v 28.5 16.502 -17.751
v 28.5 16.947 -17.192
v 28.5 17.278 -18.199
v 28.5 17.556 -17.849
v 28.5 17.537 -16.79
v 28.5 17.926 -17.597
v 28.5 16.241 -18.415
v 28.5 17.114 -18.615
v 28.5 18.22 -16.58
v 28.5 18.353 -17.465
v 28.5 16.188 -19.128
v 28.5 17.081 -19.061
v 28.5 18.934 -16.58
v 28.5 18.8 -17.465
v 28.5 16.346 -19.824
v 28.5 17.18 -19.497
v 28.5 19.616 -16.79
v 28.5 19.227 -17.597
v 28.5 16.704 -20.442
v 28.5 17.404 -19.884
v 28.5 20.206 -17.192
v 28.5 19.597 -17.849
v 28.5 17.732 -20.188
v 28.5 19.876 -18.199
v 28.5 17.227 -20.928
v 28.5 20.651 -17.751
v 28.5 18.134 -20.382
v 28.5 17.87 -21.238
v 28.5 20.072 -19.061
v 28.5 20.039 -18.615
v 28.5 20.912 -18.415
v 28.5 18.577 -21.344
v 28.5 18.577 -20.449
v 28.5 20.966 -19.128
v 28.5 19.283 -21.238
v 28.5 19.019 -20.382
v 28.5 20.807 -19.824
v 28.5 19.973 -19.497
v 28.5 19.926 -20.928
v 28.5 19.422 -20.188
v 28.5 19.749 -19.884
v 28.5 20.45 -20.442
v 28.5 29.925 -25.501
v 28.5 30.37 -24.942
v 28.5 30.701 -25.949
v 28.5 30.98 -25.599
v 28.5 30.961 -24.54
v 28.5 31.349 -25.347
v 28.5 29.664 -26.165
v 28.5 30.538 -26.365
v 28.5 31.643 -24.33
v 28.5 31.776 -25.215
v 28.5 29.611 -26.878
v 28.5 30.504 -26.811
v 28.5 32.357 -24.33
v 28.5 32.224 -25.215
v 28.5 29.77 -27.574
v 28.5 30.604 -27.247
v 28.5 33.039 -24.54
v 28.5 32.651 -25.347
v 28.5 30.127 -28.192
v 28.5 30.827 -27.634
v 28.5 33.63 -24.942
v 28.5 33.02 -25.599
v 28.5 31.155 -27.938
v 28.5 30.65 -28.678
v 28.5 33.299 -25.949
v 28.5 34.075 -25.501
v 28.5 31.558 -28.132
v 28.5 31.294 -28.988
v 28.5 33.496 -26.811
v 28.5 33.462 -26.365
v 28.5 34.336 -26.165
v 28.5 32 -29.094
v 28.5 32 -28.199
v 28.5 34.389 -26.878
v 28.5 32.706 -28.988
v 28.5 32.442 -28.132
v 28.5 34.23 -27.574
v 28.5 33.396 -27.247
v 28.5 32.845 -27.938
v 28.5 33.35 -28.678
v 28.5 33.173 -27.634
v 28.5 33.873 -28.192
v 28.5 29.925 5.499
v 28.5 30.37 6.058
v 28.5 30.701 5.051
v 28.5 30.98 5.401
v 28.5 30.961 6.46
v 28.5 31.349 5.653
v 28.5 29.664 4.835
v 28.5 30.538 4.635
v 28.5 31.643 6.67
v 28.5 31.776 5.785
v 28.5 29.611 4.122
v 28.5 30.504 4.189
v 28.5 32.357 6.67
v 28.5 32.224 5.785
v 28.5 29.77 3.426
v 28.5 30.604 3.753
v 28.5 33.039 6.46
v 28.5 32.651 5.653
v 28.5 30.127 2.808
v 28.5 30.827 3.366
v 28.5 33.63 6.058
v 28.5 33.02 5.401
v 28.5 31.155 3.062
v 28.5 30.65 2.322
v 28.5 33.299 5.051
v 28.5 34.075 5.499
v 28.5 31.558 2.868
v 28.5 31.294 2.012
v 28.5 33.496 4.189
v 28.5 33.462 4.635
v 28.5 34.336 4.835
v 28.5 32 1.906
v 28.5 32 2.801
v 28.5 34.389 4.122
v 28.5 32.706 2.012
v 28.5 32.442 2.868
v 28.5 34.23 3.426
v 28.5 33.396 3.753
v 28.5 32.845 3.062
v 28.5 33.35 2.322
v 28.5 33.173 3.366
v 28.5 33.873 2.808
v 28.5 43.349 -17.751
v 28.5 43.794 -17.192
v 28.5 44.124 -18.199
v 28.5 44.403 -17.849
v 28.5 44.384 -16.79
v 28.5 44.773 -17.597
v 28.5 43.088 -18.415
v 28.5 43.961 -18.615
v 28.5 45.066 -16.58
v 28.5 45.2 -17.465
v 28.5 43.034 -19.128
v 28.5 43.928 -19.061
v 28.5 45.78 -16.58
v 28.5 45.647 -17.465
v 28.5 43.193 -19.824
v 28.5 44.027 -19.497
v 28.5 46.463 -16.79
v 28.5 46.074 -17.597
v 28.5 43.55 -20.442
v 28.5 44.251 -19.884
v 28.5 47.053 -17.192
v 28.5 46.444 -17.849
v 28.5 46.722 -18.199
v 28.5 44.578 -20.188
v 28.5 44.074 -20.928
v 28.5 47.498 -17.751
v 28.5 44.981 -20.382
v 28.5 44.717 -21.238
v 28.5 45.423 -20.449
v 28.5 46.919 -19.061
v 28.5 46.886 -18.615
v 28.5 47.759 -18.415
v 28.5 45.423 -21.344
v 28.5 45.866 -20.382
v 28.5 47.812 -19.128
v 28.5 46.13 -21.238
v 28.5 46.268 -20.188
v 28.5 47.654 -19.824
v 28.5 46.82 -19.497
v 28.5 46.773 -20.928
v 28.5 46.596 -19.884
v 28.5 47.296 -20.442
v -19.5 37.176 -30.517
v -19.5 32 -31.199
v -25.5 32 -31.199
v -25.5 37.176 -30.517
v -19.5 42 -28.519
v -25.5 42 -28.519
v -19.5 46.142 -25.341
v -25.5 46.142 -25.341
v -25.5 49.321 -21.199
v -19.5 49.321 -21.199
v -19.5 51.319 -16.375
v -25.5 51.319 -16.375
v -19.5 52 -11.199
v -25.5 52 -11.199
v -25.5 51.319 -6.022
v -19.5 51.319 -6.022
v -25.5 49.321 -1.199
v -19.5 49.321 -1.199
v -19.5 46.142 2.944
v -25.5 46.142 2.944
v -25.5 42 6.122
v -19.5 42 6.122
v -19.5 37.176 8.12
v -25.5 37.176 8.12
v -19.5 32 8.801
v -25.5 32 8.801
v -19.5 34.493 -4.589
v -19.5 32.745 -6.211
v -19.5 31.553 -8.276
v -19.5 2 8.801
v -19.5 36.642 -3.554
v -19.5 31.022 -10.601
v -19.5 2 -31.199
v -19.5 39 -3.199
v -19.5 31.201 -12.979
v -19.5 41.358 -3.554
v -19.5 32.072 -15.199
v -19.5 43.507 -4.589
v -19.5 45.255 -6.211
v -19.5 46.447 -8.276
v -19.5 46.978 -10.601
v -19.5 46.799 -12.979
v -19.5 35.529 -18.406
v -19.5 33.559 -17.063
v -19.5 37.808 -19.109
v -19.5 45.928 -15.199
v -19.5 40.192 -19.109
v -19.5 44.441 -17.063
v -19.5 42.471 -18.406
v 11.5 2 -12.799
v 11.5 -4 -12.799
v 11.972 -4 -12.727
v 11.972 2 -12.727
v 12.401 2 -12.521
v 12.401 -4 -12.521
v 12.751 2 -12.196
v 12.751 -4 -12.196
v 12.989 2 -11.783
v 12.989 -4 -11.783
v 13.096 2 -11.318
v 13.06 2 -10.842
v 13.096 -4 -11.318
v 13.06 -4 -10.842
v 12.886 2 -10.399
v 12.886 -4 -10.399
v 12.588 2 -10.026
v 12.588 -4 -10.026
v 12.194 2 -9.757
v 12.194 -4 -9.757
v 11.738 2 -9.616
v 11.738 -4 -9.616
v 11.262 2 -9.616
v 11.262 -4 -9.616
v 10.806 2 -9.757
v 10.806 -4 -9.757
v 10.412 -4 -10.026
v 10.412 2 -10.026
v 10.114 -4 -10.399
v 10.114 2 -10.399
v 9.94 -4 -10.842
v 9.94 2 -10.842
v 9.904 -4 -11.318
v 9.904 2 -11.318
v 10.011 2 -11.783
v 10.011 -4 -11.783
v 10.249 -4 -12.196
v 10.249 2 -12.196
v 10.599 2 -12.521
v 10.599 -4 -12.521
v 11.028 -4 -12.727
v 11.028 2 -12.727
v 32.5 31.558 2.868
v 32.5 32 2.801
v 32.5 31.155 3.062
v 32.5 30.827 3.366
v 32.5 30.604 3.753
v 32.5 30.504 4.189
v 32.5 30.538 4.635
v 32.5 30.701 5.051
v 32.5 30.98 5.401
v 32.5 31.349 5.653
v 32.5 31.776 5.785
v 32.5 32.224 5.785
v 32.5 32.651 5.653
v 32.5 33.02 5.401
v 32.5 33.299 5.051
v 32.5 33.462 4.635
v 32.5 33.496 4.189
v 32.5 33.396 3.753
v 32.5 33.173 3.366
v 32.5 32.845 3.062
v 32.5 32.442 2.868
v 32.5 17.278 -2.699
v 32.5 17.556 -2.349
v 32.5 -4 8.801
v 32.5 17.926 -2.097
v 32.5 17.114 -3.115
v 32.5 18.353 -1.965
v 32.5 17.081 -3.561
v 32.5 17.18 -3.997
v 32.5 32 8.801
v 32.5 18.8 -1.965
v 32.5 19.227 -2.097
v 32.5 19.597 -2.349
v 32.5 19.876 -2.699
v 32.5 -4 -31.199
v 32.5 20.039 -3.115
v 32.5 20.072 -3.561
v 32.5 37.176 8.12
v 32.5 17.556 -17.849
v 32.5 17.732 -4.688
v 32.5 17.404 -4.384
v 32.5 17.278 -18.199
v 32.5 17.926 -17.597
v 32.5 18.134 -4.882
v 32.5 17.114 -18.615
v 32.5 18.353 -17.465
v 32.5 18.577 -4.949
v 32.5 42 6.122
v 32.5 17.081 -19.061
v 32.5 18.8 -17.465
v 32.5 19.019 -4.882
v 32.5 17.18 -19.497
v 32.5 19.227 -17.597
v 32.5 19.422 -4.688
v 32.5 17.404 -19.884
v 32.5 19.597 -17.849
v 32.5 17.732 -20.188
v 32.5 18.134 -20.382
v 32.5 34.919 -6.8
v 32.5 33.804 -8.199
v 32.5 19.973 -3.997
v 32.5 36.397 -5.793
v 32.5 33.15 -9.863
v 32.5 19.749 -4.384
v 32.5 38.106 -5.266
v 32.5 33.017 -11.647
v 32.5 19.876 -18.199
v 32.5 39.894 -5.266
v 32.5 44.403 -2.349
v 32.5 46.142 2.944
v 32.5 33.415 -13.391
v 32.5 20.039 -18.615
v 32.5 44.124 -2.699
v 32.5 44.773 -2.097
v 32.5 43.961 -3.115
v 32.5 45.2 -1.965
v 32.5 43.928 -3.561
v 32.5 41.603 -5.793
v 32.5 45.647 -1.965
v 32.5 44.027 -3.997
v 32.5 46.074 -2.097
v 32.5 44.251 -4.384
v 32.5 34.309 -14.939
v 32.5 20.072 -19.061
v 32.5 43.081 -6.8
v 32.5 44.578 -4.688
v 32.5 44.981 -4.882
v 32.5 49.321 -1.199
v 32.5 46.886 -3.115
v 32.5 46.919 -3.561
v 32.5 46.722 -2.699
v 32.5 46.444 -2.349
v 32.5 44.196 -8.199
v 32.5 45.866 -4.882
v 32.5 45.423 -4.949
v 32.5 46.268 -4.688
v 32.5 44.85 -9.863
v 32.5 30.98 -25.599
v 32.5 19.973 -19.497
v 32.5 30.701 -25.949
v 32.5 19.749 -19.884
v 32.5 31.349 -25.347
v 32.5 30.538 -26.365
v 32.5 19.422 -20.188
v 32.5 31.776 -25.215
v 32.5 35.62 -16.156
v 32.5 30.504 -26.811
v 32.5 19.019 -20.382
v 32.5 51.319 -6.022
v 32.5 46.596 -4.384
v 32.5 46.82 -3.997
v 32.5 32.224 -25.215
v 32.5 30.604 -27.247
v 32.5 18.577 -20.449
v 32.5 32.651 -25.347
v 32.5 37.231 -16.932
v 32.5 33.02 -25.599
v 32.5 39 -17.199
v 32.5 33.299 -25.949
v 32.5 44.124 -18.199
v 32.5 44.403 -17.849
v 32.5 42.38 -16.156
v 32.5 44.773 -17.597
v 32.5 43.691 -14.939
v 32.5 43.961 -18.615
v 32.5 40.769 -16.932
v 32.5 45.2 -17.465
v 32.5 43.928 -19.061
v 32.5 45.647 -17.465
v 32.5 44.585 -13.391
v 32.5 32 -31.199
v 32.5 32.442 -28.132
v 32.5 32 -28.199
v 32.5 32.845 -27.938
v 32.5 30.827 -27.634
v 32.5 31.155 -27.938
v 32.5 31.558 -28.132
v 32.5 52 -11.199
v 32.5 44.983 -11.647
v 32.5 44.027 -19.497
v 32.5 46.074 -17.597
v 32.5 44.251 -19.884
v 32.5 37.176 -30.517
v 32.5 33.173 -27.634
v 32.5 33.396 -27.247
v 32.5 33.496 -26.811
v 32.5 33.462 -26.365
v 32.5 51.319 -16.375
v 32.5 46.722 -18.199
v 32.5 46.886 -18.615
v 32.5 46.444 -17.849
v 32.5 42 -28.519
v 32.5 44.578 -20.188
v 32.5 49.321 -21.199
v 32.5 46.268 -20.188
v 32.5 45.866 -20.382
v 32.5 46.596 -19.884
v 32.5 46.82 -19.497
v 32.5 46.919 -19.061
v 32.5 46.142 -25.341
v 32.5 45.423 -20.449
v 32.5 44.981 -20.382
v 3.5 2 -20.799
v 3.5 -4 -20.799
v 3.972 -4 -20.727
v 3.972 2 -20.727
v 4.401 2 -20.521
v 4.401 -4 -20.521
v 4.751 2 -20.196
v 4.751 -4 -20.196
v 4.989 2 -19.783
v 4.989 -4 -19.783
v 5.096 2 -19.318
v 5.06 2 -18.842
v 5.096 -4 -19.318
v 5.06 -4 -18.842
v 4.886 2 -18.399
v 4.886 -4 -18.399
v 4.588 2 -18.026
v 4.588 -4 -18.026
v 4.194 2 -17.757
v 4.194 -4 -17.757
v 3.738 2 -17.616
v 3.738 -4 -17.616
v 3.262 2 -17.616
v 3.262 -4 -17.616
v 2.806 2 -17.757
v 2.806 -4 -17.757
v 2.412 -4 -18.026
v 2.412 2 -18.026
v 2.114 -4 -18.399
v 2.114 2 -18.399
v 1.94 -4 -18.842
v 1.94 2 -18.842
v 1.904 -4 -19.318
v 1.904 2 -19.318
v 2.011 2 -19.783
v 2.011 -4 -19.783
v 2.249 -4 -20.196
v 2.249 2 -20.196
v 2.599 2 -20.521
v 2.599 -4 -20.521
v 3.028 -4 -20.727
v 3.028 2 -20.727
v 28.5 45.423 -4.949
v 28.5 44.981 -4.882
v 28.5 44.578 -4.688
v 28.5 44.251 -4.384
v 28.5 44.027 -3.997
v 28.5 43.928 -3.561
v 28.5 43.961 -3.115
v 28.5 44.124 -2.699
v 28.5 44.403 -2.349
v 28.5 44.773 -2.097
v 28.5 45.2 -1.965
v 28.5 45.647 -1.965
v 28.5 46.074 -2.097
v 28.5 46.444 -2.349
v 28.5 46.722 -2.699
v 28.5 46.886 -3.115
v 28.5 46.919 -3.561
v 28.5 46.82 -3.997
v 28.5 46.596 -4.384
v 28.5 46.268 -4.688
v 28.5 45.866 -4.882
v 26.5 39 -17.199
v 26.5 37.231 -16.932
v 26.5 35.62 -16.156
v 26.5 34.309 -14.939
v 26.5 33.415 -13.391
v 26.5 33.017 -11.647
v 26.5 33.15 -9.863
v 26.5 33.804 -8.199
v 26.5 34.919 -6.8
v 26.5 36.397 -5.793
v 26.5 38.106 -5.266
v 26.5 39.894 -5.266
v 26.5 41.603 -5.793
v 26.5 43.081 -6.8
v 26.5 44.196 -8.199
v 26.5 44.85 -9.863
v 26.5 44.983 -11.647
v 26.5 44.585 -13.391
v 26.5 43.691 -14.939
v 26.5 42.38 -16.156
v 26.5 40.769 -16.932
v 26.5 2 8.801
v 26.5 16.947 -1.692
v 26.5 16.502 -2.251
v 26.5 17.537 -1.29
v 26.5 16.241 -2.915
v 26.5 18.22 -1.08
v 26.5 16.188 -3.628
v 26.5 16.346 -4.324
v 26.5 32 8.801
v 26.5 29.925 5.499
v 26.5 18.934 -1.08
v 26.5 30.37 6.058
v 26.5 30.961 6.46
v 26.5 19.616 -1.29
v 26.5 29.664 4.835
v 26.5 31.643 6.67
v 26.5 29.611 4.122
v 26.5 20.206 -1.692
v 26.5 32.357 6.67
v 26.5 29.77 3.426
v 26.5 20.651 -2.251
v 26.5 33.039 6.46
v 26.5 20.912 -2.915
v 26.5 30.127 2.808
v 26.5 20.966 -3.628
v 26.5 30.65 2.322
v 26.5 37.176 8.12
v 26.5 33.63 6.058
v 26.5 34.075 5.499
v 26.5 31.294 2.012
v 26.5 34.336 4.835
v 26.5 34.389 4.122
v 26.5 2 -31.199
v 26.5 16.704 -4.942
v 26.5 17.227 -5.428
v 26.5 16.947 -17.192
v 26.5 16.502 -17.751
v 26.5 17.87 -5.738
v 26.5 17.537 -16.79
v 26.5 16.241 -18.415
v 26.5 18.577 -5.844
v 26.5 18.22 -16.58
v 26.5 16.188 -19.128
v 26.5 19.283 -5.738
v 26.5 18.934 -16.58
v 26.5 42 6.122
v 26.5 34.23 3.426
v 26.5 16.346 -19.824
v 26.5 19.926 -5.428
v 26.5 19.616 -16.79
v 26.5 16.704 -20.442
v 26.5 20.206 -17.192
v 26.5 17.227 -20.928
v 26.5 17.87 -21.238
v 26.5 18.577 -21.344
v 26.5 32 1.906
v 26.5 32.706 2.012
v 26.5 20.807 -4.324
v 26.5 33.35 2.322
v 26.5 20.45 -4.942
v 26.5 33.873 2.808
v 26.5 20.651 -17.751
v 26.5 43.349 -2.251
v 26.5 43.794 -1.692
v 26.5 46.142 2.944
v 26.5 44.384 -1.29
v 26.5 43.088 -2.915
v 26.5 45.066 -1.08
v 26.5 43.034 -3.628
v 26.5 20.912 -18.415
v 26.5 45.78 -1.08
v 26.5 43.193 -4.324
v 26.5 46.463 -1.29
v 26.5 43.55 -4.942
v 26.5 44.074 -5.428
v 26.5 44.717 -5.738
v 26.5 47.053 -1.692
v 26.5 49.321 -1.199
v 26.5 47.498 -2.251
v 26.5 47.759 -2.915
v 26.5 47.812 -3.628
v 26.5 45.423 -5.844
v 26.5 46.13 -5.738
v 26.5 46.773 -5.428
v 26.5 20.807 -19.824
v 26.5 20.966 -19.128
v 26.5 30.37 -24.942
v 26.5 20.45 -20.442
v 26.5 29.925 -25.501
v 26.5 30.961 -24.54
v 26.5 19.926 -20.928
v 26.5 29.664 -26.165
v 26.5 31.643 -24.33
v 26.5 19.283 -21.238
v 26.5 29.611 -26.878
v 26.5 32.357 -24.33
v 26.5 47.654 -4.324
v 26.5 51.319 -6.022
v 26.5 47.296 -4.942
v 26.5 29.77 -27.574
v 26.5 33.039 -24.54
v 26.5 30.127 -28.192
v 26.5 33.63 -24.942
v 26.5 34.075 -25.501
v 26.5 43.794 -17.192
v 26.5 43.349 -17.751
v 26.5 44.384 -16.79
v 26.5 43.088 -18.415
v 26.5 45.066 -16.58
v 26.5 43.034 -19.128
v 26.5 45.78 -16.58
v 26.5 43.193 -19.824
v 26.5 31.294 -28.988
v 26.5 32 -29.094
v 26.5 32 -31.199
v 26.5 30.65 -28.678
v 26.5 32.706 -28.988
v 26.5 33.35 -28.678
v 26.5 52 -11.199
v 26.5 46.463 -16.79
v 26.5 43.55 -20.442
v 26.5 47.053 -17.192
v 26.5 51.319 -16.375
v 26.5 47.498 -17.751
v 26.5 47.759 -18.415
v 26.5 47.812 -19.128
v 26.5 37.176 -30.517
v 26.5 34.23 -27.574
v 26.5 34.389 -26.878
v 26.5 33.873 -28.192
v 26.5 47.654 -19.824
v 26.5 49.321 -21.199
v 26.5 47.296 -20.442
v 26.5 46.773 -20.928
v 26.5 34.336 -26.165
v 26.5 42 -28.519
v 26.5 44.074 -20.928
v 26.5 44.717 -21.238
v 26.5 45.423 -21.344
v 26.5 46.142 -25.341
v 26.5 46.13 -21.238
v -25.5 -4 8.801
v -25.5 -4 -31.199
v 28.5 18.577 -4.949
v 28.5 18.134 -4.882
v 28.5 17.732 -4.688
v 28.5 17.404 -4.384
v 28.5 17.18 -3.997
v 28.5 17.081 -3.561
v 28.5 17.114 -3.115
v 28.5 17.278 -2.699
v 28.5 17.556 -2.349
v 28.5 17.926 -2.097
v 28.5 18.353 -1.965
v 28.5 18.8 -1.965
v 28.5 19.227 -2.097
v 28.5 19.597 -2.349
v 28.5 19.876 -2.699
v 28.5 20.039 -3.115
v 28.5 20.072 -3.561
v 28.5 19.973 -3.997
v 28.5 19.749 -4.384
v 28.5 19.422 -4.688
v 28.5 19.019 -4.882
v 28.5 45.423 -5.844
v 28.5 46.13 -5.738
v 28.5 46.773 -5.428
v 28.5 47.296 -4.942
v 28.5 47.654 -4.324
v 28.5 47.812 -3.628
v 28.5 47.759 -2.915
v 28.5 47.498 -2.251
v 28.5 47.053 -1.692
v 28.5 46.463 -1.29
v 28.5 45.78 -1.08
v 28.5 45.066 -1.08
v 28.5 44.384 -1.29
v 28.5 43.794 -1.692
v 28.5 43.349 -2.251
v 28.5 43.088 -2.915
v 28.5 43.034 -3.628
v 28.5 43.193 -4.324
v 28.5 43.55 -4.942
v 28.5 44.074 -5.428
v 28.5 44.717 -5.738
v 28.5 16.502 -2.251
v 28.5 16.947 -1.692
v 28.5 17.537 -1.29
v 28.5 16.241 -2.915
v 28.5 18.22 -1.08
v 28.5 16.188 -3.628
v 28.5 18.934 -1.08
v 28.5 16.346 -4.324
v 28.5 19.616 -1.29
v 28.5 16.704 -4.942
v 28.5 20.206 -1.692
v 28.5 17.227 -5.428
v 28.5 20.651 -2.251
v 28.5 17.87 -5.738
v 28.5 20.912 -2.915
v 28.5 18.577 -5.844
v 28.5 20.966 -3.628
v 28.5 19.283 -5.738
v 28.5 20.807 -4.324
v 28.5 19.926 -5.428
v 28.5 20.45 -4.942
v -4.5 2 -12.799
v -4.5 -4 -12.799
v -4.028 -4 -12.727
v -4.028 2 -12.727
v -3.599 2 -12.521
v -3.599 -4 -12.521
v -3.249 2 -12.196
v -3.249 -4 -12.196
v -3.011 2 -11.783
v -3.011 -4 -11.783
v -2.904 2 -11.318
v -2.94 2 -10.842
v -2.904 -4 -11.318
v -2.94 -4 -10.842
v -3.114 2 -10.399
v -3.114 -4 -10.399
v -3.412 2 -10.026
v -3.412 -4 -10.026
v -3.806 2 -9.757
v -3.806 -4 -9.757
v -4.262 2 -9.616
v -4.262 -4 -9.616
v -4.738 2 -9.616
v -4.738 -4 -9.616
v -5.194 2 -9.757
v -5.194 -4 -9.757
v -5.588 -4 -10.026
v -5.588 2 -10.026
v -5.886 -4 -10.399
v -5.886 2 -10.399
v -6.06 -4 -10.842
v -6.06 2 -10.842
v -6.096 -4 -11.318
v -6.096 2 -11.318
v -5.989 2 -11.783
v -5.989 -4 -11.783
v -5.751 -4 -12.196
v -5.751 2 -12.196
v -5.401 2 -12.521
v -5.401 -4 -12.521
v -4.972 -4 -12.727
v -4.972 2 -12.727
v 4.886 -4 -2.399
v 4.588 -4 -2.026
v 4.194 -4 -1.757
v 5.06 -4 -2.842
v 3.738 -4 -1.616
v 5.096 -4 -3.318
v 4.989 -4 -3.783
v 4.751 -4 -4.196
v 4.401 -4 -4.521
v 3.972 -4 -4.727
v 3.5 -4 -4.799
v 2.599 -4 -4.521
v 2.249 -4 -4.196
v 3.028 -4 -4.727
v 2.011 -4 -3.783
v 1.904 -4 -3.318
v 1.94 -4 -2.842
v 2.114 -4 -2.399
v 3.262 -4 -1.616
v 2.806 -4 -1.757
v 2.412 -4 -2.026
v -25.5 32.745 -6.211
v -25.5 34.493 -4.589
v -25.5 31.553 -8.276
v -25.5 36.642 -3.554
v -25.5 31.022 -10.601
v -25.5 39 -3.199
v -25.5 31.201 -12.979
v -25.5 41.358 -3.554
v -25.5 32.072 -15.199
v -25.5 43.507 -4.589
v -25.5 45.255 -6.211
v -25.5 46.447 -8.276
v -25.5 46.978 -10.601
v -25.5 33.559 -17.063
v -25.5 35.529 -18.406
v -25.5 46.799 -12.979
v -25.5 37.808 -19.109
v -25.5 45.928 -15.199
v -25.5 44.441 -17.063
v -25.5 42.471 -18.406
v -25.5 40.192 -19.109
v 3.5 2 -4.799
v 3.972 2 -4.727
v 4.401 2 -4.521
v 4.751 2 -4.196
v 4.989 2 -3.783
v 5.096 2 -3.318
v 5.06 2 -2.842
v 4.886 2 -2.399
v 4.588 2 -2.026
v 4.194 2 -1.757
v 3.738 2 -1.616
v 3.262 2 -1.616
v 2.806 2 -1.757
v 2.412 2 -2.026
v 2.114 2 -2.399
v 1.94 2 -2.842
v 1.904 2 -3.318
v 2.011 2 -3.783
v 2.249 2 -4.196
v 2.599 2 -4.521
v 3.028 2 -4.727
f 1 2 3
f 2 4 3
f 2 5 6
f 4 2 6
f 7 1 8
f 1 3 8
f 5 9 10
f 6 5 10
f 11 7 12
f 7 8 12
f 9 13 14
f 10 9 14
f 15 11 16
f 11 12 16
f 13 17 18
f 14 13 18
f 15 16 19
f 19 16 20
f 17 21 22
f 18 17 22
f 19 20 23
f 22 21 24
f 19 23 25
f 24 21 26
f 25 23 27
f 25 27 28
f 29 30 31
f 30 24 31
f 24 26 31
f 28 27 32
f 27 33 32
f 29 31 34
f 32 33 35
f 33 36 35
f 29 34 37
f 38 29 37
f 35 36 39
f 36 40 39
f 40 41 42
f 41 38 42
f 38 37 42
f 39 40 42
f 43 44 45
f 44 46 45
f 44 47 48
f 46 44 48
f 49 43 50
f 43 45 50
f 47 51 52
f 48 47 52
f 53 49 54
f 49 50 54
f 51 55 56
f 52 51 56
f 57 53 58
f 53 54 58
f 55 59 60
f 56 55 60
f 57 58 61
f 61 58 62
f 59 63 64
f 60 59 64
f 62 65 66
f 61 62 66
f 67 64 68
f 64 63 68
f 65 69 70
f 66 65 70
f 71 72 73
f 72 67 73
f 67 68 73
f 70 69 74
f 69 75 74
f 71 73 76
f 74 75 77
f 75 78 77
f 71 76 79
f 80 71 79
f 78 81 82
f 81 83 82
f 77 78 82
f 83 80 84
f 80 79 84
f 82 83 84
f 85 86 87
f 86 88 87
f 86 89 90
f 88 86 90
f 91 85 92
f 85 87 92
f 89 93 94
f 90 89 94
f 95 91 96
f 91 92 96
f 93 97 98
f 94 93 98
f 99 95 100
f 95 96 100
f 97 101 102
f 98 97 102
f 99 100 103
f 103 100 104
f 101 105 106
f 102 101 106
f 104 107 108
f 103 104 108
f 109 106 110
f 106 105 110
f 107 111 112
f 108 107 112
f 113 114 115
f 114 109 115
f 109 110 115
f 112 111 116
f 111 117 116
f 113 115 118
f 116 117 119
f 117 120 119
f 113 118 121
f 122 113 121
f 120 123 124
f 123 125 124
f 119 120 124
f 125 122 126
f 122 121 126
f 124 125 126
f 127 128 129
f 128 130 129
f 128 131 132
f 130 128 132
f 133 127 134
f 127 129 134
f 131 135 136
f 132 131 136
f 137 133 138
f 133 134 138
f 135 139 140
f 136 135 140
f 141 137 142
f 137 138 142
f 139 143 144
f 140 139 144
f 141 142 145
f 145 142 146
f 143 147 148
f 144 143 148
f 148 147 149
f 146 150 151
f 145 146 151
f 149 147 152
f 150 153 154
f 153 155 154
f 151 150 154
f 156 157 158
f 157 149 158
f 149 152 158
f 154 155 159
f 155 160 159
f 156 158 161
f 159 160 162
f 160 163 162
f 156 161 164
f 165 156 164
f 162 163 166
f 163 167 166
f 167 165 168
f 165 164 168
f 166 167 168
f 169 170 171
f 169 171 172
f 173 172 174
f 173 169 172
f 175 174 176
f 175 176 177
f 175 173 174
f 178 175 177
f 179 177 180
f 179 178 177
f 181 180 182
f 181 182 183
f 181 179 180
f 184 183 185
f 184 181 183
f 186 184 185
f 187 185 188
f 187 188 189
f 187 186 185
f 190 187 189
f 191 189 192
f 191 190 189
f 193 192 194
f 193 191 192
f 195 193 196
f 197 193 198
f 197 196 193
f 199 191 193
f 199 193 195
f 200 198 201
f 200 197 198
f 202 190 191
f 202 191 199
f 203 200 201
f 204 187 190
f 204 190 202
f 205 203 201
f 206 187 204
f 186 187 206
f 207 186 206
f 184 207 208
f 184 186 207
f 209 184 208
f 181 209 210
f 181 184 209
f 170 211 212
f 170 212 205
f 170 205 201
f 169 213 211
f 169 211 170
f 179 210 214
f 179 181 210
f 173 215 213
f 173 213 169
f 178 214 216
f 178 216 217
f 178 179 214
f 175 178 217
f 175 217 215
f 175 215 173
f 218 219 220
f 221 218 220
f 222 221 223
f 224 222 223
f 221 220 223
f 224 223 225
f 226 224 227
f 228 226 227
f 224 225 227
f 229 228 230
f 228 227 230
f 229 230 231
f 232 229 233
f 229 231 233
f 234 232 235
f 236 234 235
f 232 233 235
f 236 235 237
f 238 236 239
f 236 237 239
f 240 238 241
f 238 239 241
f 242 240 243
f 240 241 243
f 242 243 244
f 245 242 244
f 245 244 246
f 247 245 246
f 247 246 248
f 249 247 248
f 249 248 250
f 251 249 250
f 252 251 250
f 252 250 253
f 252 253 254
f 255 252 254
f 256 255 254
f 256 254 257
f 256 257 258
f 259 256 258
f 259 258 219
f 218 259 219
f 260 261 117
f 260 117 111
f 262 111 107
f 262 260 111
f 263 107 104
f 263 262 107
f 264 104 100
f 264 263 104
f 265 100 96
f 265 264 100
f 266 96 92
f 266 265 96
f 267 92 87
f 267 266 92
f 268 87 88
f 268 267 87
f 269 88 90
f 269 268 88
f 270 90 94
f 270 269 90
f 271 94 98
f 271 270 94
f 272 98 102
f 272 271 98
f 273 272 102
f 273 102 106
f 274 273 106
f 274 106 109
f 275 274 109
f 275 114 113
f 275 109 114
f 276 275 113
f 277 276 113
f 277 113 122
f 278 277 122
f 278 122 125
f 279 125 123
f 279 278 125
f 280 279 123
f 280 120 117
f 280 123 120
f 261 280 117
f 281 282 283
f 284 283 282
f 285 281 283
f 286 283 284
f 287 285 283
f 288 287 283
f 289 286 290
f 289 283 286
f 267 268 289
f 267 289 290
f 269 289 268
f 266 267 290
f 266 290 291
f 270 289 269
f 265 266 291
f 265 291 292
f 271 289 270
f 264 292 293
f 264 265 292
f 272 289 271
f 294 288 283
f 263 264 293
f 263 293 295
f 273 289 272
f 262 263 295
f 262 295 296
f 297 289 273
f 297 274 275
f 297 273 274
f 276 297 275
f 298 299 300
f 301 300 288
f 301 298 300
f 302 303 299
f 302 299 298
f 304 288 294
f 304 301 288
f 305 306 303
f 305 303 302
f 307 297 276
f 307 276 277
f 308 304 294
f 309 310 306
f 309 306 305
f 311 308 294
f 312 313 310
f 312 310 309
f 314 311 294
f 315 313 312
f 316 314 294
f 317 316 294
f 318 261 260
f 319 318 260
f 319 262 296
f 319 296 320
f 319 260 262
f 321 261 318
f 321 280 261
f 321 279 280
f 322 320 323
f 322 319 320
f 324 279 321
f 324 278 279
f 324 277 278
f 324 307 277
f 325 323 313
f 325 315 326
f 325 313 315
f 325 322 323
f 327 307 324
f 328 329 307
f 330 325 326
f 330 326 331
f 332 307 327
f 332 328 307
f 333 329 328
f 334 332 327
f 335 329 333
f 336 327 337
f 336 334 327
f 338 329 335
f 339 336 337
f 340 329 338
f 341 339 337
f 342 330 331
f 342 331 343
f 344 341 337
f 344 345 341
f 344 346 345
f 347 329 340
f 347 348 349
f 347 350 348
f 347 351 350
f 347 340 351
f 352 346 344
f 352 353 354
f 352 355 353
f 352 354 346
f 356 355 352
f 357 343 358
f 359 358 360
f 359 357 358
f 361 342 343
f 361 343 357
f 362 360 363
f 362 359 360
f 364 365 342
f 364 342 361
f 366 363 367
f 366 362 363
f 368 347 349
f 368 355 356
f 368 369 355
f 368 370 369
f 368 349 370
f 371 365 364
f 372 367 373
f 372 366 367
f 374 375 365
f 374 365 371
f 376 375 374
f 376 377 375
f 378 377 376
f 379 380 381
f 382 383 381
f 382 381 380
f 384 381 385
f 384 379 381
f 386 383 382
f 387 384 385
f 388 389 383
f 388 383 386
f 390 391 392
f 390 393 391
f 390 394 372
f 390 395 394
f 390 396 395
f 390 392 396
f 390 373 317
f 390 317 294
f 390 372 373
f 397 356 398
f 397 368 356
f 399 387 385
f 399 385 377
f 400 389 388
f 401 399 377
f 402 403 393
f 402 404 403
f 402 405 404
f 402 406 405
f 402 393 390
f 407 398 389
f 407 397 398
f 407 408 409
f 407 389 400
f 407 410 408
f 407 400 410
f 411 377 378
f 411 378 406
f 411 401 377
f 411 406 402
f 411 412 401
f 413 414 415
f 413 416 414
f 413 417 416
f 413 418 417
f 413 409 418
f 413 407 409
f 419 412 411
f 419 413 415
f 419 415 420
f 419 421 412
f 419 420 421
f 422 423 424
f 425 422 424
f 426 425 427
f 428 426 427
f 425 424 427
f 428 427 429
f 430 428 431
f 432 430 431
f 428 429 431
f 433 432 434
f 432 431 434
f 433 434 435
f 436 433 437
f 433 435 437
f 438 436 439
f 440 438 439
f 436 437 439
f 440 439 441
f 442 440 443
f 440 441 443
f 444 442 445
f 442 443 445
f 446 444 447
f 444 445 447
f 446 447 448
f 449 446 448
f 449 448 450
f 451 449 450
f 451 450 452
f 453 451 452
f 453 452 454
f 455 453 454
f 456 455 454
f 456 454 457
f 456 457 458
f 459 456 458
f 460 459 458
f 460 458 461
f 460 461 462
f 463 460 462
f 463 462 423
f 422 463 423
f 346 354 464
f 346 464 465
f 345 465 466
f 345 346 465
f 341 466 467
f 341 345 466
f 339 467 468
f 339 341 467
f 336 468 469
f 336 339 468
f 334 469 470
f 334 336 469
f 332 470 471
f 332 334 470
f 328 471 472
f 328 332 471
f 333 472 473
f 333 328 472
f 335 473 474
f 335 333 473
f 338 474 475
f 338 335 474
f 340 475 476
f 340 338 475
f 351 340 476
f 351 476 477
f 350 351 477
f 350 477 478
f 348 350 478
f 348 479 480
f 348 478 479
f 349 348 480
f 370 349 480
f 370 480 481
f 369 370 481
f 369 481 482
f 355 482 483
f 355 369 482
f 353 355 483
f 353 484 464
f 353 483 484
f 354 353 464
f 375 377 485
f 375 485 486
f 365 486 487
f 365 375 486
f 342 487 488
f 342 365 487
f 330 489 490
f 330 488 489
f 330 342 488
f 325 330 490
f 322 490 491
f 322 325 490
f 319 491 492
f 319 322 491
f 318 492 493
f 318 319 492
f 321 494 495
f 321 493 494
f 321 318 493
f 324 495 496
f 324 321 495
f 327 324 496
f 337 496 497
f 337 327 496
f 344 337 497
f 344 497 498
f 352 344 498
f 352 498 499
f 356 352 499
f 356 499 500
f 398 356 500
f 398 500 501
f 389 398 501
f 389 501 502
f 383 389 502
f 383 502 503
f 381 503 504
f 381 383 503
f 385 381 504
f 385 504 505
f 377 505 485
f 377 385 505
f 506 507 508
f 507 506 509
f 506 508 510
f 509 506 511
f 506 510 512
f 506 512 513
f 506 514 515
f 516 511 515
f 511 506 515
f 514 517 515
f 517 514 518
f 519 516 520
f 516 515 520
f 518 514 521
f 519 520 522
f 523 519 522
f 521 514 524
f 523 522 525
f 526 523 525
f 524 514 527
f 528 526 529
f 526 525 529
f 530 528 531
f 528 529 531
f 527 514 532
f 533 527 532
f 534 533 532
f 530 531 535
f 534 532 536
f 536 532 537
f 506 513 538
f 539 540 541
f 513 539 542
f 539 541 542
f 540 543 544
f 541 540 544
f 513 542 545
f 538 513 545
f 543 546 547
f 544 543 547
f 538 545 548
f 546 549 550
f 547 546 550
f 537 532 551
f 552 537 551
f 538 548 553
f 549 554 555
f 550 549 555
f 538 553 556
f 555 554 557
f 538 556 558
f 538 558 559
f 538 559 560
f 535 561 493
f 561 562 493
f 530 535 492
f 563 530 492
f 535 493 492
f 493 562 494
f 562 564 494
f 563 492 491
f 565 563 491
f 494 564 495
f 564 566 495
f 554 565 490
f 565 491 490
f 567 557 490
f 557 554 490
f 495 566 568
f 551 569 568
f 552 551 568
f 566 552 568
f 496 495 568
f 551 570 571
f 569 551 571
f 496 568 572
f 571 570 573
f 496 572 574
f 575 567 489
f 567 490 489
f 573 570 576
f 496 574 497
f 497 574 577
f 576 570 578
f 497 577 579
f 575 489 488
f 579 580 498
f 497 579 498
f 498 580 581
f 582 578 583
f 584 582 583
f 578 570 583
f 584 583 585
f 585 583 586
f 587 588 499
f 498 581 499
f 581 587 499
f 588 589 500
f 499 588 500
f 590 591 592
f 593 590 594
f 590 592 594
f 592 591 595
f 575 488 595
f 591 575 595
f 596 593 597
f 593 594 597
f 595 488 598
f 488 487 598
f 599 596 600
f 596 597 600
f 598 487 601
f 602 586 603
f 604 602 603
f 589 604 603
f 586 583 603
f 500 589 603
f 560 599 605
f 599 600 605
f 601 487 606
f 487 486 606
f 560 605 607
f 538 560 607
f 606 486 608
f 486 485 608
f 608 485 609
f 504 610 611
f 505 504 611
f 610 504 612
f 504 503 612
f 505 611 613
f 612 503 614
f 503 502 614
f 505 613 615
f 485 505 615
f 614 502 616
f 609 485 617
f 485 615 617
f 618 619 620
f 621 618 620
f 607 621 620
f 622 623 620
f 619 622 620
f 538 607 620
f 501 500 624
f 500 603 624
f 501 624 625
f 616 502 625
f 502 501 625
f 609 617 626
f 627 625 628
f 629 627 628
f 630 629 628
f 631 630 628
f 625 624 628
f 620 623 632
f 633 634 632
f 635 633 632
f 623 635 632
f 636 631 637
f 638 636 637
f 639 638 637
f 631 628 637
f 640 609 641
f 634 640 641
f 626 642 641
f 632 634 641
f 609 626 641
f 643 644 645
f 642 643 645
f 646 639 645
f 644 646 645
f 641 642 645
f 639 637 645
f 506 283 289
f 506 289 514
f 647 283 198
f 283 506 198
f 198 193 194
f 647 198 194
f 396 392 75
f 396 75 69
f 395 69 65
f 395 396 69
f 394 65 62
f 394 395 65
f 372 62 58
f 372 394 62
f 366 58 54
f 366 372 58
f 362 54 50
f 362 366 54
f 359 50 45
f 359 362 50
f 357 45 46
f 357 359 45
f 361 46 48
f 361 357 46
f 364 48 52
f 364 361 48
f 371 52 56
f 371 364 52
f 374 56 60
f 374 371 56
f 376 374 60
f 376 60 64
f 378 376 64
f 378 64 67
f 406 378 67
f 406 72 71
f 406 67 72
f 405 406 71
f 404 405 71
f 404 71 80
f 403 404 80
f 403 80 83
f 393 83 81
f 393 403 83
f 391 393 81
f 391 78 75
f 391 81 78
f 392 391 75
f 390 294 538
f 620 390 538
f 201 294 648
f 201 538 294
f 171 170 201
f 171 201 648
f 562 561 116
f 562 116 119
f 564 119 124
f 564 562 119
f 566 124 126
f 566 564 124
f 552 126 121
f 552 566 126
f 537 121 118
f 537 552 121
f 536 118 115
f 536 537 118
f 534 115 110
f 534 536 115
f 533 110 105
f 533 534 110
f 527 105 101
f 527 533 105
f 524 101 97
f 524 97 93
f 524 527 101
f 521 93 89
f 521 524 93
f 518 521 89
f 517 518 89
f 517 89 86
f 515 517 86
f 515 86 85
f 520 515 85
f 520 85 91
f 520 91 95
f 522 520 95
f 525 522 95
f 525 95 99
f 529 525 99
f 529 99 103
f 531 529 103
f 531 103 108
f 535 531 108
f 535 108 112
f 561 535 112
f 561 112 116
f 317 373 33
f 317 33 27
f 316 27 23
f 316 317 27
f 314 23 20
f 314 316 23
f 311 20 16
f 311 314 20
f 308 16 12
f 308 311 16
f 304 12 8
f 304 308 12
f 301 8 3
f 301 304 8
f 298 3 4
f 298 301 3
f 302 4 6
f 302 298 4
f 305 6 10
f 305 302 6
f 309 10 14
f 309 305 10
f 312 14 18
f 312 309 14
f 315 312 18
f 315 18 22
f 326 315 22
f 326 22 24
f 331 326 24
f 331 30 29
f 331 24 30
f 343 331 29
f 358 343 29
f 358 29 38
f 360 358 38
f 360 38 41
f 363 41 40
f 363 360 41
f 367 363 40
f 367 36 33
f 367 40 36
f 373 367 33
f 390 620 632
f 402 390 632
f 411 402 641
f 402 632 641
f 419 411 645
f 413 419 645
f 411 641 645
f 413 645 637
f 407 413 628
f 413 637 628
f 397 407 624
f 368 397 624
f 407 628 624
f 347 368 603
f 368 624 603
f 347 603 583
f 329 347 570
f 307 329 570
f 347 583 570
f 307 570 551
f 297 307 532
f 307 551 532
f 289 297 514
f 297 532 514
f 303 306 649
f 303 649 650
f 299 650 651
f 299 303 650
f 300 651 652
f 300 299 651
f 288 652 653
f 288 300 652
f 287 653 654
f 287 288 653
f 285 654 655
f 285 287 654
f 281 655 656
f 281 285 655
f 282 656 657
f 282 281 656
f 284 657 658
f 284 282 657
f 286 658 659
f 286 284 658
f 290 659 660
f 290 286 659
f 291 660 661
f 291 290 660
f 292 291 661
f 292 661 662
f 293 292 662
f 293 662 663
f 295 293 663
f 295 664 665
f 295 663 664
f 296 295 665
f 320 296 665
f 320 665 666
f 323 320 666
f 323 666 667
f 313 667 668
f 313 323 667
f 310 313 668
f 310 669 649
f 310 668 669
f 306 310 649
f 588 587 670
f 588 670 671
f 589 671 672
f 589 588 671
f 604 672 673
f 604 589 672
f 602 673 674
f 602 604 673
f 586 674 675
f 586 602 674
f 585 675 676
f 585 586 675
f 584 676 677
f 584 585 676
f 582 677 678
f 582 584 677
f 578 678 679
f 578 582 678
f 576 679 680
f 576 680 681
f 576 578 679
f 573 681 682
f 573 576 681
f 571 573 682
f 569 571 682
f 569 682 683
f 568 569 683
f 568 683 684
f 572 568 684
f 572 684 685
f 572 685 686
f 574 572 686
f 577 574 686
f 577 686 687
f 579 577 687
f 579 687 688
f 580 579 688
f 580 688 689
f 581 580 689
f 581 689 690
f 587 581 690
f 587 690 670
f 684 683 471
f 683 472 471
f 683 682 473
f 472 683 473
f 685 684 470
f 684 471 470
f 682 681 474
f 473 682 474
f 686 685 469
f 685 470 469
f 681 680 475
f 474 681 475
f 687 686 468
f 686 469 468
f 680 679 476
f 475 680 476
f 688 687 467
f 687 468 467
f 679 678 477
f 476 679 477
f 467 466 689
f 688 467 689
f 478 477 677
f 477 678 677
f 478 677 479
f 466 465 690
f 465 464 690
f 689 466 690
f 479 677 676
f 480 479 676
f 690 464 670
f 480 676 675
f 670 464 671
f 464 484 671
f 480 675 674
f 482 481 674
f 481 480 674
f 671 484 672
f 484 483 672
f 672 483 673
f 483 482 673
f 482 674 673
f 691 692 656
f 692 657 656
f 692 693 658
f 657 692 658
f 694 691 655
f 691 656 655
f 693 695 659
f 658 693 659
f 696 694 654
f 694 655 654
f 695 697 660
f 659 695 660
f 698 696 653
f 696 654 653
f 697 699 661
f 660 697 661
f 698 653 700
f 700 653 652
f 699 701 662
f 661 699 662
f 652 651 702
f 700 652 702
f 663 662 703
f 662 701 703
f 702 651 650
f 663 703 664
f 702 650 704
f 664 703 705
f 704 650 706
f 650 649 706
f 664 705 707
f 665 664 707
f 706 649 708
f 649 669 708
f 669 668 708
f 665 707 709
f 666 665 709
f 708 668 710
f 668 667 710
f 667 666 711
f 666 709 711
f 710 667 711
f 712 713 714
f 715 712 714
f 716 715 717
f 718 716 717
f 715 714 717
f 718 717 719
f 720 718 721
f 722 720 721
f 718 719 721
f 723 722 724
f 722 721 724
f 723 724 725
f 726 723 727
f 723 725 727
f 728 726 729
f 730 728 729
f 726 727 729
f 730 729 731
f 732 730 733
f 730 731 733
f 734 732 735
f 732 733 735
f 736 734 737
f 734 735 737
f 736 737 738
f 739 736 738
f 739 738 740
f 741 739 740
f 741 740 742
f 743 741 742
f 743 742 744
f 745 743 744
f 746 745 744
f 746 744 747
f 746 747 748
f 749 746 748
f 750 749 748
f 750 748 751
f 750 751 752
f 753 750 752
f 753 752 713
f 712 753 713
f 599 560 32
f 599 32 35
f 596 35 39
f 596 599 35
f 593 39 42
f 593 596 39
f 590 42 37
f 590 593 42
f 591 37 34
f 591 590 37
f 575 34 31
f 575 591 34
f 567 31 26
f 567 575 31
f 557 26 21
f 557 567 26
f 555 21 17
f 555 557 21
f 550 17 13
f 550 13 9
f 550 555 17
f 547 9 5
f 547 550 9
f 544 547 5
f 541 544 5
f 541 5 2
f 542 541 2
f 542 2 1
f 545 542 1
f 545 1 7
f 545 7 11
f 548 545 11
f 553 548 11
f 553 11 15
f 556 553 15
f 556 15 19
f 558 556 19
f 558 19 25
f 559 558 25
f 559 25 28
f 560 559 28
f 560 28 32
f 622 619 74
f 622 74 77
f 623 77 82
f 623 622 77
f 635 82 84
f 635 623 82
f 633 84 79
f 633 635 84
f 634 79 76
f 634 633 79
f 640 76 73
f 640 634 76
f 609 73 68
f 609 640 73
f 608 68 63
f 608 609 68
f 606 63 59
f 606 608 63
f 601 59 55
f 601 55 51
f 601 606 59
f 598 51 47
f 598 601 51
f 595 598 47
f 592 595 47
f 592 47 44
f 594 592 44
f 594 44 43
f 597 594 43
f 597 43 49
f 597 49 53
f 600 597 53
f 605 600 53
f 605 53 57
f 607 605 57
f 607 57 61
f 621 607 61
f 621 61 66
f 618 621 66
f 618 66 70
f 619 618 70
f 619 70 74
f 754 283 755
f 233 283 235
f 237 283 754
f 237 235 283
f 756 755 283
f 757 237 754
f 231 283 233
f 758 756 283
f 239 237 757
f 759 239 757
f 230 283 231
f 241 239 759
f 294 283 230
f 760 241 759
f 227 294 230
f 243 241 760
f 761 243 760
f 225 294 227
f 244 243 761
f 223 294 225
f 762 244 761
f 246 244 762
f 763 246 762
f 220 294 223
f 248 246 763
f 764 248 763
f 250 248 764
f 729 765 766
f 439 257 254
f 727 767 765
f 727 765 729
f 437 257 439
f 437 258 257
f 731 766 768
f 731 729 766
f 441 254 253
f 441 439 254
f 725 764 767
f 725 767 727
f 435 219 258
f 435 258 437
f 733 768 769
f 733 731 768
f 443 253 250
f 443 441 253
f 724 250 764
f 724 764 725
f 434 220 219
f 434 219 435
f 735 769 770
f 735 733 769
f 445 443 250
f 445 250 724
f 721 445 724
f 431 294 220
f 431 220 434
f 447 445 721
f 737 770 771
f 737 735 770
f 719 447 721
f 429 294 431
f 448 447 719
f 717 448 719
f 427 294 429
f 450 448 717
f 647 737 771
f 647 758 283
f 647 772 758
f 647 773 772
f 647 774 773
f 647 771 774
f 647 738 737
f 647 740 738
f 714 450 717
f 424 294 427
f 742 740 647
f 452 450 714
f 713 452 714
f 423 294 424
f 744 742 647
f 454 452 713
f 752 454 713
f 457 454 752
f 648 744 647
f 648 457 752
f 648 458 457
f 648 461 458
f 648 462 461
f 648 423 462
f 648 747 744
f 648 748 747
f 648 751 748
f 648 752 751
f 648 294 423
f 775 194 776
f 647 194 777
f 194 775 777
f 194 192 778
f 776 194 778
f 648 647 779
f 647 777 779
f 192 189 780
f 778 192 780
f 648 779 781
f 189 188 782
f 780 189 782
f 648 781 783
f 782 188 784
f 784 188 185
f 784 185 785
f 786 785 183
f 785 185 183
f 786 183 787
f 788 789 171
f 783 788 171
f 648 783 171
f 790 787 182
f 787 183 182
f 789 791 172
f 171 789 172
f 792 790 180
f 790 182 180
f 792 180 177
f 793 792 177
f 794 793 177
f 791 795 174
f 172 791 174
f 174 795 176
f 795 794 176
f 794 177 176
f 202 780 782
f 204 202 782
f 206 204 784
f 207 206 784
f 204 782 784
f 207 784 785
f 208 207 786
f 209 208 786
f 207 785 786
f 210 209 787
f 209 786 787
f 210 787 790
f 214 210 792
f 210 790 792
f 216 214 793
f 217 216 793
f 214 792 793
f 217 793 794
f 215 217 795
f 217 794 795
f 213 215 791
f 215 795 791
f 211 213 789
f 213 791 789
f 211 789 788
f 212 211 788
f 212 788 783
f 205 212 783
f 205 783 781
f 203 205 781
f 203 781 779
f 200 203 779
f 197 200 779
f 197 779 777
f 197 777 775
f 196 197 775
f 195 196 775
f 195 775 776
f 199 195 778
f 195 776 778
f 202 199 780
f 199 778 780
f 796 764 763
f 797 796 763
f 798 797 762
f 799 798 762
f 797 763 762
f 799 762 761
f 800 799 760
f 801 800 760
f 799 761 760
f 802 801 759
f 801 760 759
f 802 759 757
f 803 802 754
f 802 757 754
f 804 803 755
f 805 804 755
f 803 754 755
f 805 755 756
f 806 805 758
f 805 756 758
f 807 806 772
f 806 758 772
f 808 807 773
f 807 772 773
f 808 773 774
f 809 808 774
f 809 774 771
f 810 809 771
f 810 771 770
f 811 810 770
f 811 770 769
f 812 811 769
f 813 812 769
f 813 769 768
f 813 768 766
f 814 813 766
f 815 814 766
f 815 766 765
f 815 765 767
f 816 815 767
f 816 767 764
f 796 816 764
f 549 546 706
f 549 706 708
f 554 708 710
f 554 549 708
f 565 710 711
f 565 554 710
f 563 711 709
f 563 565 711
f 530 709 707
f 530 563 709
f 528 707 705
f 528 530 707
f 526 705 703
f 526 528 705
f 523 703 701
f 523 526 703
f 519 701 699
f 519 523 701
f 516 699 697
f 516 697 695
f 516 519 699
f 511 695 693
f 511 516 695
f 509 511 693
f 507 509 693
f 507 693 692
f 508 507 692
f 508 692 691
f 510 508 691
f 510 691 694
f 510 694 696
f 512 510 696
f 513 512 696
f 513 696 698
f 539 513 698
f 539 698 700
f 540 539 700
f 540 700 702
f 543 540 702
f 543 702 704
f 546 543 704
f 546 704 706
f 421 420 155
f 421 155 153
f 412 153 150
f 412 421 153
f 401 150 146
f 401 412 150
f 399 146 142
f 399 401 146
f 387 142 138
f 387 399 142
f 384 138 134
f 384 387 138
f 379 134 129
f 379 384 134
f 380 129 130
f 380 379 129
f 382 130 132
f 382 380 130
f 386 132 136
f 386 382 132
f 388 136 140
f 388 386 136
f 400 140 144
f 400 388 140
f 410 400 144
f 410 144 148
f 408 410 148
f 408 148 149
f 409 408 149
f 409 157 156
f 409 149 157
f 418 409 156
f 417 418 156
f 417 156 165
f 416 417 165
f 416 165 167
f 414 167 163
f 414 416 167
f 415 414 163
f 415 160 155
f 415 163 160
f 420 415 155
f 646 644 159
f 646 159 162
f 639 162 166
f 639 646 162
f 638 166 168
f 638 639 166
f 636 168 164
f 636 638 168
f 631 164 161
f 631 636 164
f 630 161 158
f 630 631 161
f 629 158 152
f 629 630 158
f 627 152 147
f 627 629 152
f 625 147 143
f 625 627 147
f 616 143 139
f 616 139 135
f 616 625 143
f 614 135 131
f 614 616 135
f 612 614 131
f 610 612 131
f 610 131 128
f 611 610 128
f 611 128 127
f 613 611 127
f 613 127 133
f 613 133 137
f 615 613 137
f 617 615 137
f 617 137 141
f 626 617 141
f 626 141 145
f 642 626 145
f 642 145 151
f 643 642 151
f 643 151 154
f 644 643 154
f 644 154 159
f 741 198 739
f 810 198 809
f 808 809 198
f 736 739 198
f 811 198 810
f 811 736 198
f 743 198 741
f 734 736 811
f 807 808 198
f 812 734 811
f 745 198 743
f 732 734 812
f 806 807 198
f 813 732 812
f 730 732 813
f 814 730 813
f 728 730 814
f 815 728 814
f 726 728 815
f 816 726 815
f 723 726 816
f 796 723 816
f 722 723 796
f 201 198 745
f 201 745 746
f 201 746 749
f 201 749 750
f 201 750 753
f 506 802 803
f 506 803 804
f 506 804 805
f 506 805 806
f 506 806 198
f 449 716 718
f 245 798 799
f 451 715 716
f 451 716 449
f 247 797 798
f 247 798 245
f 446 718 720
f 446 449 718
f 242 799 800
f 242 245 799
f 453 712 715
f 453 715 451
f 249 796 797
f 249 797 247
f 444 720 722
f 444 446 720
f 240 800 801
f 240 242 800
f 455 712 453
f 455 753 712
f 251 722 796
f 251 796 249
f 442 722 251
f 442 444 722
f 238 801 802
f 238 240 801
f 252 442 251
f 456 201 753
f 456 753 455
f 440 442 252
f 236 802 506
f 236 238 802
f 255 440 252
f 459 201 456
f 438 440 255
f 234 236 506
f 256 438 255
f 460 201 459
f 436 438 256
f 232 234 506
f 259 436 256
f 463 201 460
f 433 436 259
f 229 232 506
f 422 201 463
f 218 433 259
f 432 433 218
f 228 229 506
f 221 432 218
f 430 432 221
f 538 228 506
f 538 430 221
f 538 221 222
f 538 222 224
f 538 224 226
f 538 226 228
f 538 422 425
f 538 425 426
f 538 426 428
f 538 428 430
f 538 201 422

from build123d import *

# Parameters (mm, degrees)
BOSS_EXTRUDE2_DEPTH         = 2
BOSS_EXTRUDE2_DEPTH_BACK    = 4
SKETCH2_W                   = 50
SKETCH2_H                   = 40
BOSS_EXTRUDE3_DEPTH         = 4
BOSS_EXTRUDE3_DEPTH_BACK    = 2
BOSS_EXTRUDE4_DEPTH         = 4
BOSS_EXTRUDE4_DEPTH_BACK    = 2
CUT_EXTRUDE1_DEPTH          = 10
CUT_EXTRUDE1_DEPTH_BACK     = 92
SKETCH7_R                   = 1.5
SKETCH7_R_2                 = 6
SKETCH8_R                   = 3
CUT_EXTRUDE2_DEPTH          = 92
Y_KSEKLIK_EKSTR_ZYON2_DEPTH = 6
SKETCH9_W                   = 11
SKETCH9_H                   = 6
BOSS_EXTRUDE5_DEPTH         = 40
SKETCH10_W                  = 7
SKETCH10_H                  = 40
CUT_EXTRUDE3_DEPTH          = 10
IZIM8_R                     = 2.395734713
KES_EKSTR_ZYON2_DEPTH       = 48
Y_KSEKLIK_EKSTR_ZYON3_DEPTH = 6
IZIM10_R                    = 8
KES_EKSTR_ZYON3_DEPTH       = 6
IZIM11_R                    = 1.6
KES_EKSTR_ZYON5_DEPTH       = 10
IZIM13_R                    = 3.884194159
Y_KSEKLIK_EKSTR_ZYON4_DEPTH = 6


with BuildPart() as part:
    # Sketch2 → Boss-Extrude2 (new, two sides: drawn at the far end of the back side and taken through both)
    with BuildSketch(Plane(origin=(0, 0, 0), x_dir=(1, 0, 0), z_dir=(0, 1, 0)).offset(-BOSS_EXTRUDE2_DEPTH_BACK)):
        with Locations((3.5, 11.198529412)):
            Rectangle(SKETCH2_W, SKETCH2_H)
    extrude(amount=BOSS_EXTRUDE2_DEPTH + BOSS_EXTRUDE2_DEPTH_BACK)

    # Sketch4 → Boss-Extrude3 (add, two sides: drawn at the far end of the back side and taken through both)
    with BuildSketch(Plane.ZY.offset(21.5).offset(-BOSS_EXTRUDE3_DEPTH_BACK)):
        with BuildLine():
            Line((8.801470588, 2), (-31.198529412, 2))
            Line((-31.198529412, 2), (-31.198529412, 32))
            ThreePointArc((-31.198529412, 32), (-11.198529412, 52), (8.801470588, 32))
            Line((8.801470588, 32), (8.801470588, 2))
        make_face()
    extrude(amount=BOSS_EXTRUDE3_DEPTH + BOSS_EXTRUDE3_DEPTH_BACK)

    # Sketch5 → Boss-Extrude4 (add, two sides: drawn at the far end of the back side and taken through both)
    with BuildSketch(Plane(origin=(28.5, 0, 0), x_dir=(0, 0, -1), z_dir=(1, 0, 0)).offset(-BOSS_EXTRUDE4_DEPTH_BACK)):
        with BuildLine():
            Line((-8.801470588, -4), (31.198529412, -4))
            Line((31.198529412, -4), (31.198529412, 32))
            ThreePointArc((31.198529412, 32), (11.198529412, 52), (-8.801470588, 32))
            Line((-8.801470588, 32), (-8.801470588, -4))
        make_face()
    extrude(amount=BOSS_EXTRUDE4_DEPTH + BOSS_EXTRUDE4_DEPTH_BACK)

    # Sketch7 → Cut-Extrude1 (cut, two sides: drawn at the far end of the back side and taken through both)
    with BuildSketch(Plane.ZY.offset(21.5).offset(-CUT_EXTRUDE1_DEPTH_BACK)):
        with Locations(Location((4.301470588, 32, 0), (0, 0, 180))):
            Circle(SKETCH7_R)
        with Locations(Location((-3.448529412, 18.576606241, 0), (0, 0, 180))):
            Circle(SKETCH7_R)
        with Locations(Location((-18.948529412, 18.576606241, 0), (0, 0, 180))):
            Circle(SKETCH7_R)
        with Locations(Location((-26.698529412, 32, 0), (0, 0, 180))):
            Circle(SKETCH7_R)
        with Locations(Location((-18.948529412, 45.423393759, 0), (0, 0, 180))):
            Circle(SKETCH7_R)
        with Locations(Location((-3.448529412, 45.423393759, 0), (0, 0, 180))):
            Circle(SKETCH7_R)
        with Locations(Location((-11.198529412, 39, 0), (0, 0, 180))):
            Circle(SKETCH7_R_2)
    extrude(amount=CUT_EXTRUDE1_DEPTH + CUT_EXTRUDE1_DEPTH_BACK, mode=Mode.SUBTRACT)

    # Sketch8 → Cut-Extrude2 (cut)
    with BuildSketch(Plane(origin=(0, 2, 0), x_dir=(1, 0, 0), z_dir=(0, 1, 0))):
        with Locations(Location((3.5, 11.198529412, 0), (0, 0, 270))):
            Circle(SKETCH8_R)
    extrude(amount=-CUT_EXTRUDE2_DEPTH, mode=Mode.SUBTRACT)

    # Çizim4 → Yükseklik-Ekstrüzyon2 (add)
    with BuildSketch(Plane(origin=(0, 2, 0), x_dir=(1, 0, 0), z_dir=(0, 1, 0))):
        with BuildLine():
            ThreePointArc((6.5, 11.198529412), (6.499830675, 11.230402947), (6.499322719, 11.262272884))
            Line((6.499322719, 11.262272884), (6, 11.262272884))
            Line((6, 11.262272884), (6, 9.540217017))
            ThreePointArc((6, 9.540217017), (6.372281323, 10.332504008), (6.5, 11.198529412))
        make_face()
        with BuildLine():
            Line((6, 11.262272884), (6.499322719, 11.262272884))
            ThreePointArc((6.499322719, 11.262272884), (6.36291811, 12.095022522), (6, 12.856841807))
            Line((6, 12.856841807), (6, 11.262272884))
        make_face()
    extrude(amount=-Y_KSEKLIK_EKSTR_ZYON2_DEPTH)

    # Sketch9 → Boss-Extrude5 (add)
    with BuildSketch(Plane(origin=(0, 0, -31.198529412), x_dir=(-1, 0, 0), z_dir=(0, 0, -1))):
        with Locations((27, -1)):
            Rectangle(SKETCH9_W, SKETCH9_H)
    extrude(amount=-BOSS_EXTRUDE5_DEPTH)

    # Sketch10 → Cut-Extrude3 (cut)
    with BuildSketch(Plane(origin=(0, 2, 0), x_dir=(1, 0, 0), z_dir=(0, 1, 0))):
        with Locations((-29, 11.198529412)):
            Rectangle(SKETCH10_W, SKETCH10_H)
    extrude(amount=-CUT_EXTRUDE3_DEPTH, mode=Mode.SUBTRACT)

    # Çizim8 → Kes-Ekstrüzyon2 (cut)
    with BuildSketch(Plane(origin=(-19.5, 0, 0), x_dir=(0, 0, -1), z_dir=(1, 0, 0))):
        with Locations((-4.301470588, 32)):
            Circle(IZIM8_R)
        with Locations((3.448529412, 45.423393759)):
            Circle(IZIM8_R)
        with Locations((18.948529412, 45.423393759)):
            Circle(IZIM8_R)
        with Locations((26.698529412, 32)):
            Circle(IZIM8_R)
        with Locations((18.948529412, 18.576606241)):
            Circle(IZIM8_R)
        with Locations((3.448529412, 18.576606241)):
            Circle(IZIM8_R)
    extrude(amount=KES_EKSTR_ZYON2_DEPTH, mode=Mode.SUBTRACT)

    # Çizim9 → Yükseklik-Ekstrüzyon3 (add)
    with BuildSketch(Plane.ZY.offset(25.5)):
        with BuildLine():
            Line((8.801470588, -4), (8.801470588, 32))
            ThreePointArc((8.801470588, 32), (-11.198529412, 52), (-31.198529412, 32))
            Line((-31.198529412, 32), (-31.198529412, -4))
            Line((-31.198529412, -4), (8.801470588, -4))
        make_face()
    extrude(amount=-Y_KSEKLIK_EKSTR_ZYON3_DEPTH)

    # Çizim10 → Kes-Ekstrüzyon3 (cut)
    with BuildSketch(Plane.ZY.offset(25.5)):
        with Locations((-11.198529412, 39)):
            Circle(IZIM10_R)
    extrude(amount=-KES_EKSTR_ZYON3_DEPTH, mode=Mode.SUBTRACT)

    # Çizim11 → Kes-Ekstrüzyon5 (cut)
    with BuildSketch(Plane.XZ.offset(4)):
        with Locations(Location((11.5, -11.198529412, 0), (0, 0, 270))):
            Circle(IZIM11_R)
        with Locations(Location((3.5, -19.198529412, 0), (0, 0, 270))):
            Circle(IZIM11_R)
        with Locations(Location((-4.5, -11.198529412, 0), (0, 0, 270))):
            Circle(IZIM11_R)
        with Locations(Location((3.5, -3.198529412, 0), (0, 0, 270))):
            Circle(IZIM11_R)
    extrude(amount=-KES_EKSTR_ZYON5_DEPTH, mode=Mode.SUBTRACT)

    # Çizim13 → Yükseklik-Ekstrüzyon4 (add)
    with BuildSketch(Plane.XZ.offset(4)):
        with Locations((3.5, -11.198529412)):
            Circle(IZIM13_R)
    extrude(amount=-Y_KSEKLIK_EKSTR_ZYON4_DEPTH)


solid = part.part
